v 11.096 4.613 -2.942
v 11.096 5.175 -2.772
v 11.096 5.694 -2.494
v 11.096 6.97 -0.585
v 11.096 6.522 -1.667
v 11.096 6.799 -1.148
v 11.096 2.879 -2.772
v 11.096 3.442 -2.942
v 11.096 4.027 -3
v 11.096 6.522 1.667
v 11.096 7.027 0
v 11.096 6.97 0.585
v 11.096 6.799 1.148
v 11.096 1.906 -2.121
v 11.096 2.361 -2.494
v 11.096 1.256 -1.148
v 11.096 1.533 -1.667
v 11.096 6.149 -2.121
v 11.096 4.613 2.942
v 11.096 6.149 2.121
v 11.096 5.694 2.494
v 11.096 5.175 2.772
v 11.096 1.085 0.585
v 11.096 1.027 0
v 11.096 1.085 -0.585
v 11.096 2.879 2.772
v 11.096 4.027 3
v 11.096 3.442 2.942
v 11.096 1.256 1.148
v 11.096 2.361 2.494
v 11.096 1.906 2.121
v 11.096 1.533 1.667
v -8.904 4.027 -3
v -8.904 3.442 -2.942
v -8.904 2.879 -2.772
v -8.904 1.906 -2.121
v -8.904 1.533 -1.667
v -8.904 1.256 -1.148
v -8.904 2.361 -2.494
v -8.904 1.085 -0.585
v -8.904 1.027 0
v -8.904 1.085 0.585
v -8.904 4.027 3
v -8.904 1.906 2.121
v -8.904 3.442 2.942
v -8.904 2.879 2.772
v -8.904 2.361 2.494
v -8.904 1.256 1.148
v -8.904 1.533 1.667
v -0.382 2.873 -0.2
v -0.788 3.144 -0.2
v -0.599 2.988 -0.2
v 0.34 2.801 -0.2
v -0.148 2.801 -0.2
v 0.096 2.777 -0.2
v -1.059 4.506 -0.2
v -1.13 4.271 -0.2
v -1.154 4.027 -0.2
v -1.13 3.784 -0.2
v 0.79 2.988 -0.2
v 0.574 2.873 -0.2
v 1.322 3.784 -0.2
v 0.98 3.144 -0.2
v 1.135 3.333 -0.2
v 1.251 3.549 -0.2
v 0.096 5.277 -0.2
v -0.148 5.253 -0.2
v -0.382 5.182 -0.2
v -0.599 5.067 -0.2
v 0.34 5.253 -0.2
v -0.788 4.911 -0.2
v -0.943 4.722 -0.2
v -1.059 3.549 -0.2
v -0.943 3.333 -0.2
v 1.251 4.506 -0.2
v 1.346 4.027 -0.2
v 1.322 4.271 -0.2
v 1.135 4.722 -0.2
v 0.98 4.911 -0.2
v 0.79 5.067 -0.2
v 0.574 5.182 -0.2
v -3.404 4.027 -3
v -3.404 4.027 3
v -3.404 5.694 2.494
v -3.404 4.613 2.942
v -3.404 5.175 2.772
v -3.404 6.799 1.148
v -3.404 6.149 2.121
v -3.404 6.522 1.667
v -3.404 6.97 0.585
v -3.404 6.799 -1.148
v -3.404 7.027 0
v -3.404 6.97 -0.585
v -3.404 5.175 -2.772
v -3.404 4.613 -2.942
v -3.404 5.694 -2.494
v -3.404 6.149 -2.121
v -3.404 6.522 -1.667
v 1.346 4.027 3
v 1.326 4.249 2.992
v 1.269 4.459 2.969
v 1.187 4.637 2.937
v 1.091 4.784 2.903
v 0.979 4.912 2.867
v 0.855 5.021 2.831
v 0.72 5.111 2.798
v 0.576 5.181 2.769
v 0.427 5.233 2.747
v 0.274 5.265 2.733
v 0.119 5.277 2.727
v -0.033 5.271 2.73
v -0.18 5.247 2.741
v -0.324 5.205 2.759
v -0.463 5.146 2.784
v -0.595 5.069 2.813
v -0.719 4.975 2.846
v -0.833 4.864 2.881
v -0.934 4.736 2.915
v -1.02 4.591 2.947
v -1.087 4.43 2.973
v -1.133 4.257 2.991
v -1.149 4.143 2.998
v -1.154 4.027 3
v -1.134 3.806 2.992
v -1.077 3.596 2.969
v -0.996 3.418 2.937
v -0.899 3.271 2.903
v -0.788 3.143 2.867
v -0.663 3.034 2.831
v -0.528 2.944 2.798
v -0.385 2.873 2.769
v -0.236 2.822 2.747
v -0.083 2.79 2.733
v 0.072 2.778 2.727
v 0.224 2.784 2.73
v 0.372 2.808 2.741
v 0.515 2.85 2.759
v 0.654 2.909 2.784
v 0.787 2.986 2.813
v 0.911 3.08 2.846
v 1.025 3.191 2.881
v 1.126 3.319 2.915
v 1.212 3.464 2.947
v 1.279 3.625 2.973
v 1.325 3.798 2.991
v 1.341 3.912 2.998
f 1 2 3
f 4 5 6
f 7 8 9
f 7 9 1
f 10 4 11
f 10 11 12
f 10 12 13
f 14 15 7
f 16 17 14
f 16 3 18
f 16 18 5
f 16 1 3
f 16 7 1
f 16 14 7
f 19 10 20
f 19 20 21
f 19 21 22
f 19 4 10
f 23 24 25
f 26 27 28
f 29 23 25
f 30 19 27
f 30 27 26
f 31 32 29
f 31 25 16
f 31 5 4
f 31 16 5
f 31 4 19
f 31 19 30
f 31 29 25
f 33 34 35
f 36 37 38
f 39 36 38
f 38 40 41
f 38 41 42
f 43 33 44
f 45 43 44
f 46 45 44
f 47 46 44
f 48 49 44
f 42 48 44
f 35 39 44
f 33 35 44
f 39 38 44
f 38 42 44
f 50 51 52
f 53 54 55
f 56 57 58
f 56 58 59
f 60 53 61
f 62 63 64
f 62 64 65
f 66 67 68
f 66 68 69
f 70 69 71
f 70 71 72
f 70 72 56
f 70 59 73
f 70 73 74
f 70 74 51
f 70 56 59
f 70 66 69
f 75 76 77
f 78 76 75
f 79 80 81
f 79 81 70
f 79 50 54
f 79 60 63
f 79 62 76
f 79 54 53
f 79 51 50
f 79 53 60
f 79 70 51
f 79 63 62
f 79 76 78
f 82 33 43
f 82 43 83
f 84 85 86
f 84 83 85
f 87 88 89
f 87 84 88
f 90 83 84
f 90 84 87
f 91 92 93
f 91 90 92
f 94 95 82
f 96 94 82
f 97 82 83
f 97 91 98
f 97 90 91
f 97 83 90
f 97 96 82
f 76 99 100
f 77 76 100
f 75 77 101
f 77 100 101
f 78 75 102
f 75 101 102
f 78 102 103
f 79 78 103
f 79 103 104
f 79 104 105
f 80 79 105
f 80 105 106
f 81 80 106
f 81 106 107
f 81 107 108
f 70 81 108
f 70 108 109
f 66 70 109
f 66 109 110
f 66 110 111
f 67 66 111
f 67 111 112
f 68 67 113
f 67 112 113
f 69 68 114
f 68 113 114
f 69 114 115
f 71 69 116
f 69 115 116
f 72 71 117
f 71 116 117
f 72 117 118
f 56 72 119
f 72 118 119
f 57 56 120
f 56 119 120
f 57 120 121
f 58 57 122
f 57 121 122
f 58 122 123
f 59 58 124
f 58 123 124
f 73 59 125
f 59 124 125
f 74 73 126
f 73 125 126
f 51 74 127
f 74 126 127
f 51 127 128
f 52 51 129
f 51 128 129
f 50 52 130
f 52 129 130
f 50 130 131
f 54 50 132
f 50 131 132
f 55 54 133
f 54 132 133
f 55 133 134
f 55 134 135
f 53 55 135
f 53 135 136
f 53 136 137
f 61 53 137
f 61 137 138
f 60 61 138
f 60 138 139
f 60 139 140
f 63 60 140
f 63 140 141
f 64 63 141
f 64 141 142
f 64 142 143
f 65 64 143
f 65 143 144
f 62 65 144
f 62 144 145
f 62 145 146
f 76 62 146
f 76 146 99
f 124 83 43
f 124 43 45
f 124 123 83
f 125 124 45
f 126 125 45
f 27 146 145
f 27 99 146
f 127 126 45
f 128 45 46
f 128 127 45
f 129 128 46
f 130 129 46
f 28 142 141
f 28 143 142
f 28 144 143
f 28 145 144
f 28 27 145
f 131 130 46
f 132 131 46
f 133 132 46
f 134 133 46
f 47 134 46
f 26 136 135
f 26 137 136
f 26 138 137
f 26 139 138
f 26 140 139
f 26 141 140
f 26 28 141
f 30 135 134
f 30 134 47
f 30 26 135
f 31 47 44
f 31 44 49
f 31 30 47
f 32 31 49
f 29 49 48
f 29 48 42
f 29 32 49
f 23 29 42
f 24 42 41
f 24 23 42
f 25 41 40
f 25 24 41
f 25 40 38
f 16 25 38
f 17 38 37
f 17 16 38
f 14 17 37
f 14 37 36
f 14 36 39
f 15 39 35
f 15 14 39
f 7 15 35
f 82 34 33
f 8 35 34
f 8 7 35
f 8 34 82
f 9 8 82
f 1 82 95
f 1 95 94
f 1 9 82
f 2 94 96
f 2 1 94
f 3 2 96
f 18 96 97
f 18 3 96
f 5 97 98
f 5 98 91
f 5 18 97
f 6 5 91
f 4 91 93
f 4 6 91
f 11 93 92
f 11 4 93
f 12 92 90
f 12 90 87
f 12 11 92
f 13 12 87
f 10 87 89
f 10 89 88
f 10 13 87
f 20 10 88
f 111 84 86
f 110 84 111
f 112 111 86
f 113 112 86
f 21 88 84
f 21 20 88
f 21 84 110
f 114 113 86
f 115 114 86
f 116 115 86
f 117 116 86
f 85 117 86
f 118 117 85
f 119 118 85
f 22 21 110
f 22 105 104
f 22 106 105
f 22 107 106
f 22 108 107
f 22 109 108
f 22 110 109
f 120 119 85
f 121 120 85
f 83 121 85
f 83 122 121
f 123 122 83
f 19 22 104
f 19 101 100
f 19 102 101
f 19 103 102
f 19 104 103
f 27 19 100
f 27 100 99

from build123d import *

# Parameters (mm, degrees)
SKETCH1_W               = 20
SKETCH1_H               = 3
CUT_EXTRUDE1_DEPTH      = 14.472308498
CUT_EXTRUDE1_DEPTH_BACK = 14.472308498
SKETCH2_W               = 5.5
SKETCH2_H               = 3
SKETCH4_R               = 1.25
CUT_EXTRUDE2_DEPTH      = 3.2


with BuildPart() as part:
    # Sketch1 → Revolve1 (revolve)
    with BuildSketch(Plane.XY, mode=Mode.PRIVATE) as revolve1_sk:
        with Locations((1.095890411, 2.52739726)):
            Rectangle(SKETCH1_W, SKETCH1_H)
    revolve(revolve1_sk.sketch.rotate(Axis((-8.904109589, 4.02739726, 0), (1, 0, 0)), 270), axis=Axis((-8.904109589, 4.02739726, 0), (1, 0, 0)))

    # Sketch2 → Cut-Extrude1 (cut, two sides: drawn at the far end of the back side and taken through both)
    with BuildSketch(Plane.XY.offset(-CUT_EXTRUDE1_DEPTH_BACK)):
        with Locations((-6.154109589, 5.52739726)):
            Rectangle(SKETCH2_W, SKETCH2_H)
    extrude(amount=CUT_EXTRUDE1_DEPTH + CUT_EXTRUDE1_DEPTH_BACK, mode=Mode.SUBTRACT)

    # Sketch4 → Cut-Extrude2 (cut)
    with BuildSketch(Plane.XY.offset(3)):
        with Locations((0.095890411, 4.02739726)):
            Circle(SKETCH4_R)
    extrude(amount=-CUT_EXTRUDE2_DEPTH, mode=Mode.SUBTRACT)


solid = part.part
